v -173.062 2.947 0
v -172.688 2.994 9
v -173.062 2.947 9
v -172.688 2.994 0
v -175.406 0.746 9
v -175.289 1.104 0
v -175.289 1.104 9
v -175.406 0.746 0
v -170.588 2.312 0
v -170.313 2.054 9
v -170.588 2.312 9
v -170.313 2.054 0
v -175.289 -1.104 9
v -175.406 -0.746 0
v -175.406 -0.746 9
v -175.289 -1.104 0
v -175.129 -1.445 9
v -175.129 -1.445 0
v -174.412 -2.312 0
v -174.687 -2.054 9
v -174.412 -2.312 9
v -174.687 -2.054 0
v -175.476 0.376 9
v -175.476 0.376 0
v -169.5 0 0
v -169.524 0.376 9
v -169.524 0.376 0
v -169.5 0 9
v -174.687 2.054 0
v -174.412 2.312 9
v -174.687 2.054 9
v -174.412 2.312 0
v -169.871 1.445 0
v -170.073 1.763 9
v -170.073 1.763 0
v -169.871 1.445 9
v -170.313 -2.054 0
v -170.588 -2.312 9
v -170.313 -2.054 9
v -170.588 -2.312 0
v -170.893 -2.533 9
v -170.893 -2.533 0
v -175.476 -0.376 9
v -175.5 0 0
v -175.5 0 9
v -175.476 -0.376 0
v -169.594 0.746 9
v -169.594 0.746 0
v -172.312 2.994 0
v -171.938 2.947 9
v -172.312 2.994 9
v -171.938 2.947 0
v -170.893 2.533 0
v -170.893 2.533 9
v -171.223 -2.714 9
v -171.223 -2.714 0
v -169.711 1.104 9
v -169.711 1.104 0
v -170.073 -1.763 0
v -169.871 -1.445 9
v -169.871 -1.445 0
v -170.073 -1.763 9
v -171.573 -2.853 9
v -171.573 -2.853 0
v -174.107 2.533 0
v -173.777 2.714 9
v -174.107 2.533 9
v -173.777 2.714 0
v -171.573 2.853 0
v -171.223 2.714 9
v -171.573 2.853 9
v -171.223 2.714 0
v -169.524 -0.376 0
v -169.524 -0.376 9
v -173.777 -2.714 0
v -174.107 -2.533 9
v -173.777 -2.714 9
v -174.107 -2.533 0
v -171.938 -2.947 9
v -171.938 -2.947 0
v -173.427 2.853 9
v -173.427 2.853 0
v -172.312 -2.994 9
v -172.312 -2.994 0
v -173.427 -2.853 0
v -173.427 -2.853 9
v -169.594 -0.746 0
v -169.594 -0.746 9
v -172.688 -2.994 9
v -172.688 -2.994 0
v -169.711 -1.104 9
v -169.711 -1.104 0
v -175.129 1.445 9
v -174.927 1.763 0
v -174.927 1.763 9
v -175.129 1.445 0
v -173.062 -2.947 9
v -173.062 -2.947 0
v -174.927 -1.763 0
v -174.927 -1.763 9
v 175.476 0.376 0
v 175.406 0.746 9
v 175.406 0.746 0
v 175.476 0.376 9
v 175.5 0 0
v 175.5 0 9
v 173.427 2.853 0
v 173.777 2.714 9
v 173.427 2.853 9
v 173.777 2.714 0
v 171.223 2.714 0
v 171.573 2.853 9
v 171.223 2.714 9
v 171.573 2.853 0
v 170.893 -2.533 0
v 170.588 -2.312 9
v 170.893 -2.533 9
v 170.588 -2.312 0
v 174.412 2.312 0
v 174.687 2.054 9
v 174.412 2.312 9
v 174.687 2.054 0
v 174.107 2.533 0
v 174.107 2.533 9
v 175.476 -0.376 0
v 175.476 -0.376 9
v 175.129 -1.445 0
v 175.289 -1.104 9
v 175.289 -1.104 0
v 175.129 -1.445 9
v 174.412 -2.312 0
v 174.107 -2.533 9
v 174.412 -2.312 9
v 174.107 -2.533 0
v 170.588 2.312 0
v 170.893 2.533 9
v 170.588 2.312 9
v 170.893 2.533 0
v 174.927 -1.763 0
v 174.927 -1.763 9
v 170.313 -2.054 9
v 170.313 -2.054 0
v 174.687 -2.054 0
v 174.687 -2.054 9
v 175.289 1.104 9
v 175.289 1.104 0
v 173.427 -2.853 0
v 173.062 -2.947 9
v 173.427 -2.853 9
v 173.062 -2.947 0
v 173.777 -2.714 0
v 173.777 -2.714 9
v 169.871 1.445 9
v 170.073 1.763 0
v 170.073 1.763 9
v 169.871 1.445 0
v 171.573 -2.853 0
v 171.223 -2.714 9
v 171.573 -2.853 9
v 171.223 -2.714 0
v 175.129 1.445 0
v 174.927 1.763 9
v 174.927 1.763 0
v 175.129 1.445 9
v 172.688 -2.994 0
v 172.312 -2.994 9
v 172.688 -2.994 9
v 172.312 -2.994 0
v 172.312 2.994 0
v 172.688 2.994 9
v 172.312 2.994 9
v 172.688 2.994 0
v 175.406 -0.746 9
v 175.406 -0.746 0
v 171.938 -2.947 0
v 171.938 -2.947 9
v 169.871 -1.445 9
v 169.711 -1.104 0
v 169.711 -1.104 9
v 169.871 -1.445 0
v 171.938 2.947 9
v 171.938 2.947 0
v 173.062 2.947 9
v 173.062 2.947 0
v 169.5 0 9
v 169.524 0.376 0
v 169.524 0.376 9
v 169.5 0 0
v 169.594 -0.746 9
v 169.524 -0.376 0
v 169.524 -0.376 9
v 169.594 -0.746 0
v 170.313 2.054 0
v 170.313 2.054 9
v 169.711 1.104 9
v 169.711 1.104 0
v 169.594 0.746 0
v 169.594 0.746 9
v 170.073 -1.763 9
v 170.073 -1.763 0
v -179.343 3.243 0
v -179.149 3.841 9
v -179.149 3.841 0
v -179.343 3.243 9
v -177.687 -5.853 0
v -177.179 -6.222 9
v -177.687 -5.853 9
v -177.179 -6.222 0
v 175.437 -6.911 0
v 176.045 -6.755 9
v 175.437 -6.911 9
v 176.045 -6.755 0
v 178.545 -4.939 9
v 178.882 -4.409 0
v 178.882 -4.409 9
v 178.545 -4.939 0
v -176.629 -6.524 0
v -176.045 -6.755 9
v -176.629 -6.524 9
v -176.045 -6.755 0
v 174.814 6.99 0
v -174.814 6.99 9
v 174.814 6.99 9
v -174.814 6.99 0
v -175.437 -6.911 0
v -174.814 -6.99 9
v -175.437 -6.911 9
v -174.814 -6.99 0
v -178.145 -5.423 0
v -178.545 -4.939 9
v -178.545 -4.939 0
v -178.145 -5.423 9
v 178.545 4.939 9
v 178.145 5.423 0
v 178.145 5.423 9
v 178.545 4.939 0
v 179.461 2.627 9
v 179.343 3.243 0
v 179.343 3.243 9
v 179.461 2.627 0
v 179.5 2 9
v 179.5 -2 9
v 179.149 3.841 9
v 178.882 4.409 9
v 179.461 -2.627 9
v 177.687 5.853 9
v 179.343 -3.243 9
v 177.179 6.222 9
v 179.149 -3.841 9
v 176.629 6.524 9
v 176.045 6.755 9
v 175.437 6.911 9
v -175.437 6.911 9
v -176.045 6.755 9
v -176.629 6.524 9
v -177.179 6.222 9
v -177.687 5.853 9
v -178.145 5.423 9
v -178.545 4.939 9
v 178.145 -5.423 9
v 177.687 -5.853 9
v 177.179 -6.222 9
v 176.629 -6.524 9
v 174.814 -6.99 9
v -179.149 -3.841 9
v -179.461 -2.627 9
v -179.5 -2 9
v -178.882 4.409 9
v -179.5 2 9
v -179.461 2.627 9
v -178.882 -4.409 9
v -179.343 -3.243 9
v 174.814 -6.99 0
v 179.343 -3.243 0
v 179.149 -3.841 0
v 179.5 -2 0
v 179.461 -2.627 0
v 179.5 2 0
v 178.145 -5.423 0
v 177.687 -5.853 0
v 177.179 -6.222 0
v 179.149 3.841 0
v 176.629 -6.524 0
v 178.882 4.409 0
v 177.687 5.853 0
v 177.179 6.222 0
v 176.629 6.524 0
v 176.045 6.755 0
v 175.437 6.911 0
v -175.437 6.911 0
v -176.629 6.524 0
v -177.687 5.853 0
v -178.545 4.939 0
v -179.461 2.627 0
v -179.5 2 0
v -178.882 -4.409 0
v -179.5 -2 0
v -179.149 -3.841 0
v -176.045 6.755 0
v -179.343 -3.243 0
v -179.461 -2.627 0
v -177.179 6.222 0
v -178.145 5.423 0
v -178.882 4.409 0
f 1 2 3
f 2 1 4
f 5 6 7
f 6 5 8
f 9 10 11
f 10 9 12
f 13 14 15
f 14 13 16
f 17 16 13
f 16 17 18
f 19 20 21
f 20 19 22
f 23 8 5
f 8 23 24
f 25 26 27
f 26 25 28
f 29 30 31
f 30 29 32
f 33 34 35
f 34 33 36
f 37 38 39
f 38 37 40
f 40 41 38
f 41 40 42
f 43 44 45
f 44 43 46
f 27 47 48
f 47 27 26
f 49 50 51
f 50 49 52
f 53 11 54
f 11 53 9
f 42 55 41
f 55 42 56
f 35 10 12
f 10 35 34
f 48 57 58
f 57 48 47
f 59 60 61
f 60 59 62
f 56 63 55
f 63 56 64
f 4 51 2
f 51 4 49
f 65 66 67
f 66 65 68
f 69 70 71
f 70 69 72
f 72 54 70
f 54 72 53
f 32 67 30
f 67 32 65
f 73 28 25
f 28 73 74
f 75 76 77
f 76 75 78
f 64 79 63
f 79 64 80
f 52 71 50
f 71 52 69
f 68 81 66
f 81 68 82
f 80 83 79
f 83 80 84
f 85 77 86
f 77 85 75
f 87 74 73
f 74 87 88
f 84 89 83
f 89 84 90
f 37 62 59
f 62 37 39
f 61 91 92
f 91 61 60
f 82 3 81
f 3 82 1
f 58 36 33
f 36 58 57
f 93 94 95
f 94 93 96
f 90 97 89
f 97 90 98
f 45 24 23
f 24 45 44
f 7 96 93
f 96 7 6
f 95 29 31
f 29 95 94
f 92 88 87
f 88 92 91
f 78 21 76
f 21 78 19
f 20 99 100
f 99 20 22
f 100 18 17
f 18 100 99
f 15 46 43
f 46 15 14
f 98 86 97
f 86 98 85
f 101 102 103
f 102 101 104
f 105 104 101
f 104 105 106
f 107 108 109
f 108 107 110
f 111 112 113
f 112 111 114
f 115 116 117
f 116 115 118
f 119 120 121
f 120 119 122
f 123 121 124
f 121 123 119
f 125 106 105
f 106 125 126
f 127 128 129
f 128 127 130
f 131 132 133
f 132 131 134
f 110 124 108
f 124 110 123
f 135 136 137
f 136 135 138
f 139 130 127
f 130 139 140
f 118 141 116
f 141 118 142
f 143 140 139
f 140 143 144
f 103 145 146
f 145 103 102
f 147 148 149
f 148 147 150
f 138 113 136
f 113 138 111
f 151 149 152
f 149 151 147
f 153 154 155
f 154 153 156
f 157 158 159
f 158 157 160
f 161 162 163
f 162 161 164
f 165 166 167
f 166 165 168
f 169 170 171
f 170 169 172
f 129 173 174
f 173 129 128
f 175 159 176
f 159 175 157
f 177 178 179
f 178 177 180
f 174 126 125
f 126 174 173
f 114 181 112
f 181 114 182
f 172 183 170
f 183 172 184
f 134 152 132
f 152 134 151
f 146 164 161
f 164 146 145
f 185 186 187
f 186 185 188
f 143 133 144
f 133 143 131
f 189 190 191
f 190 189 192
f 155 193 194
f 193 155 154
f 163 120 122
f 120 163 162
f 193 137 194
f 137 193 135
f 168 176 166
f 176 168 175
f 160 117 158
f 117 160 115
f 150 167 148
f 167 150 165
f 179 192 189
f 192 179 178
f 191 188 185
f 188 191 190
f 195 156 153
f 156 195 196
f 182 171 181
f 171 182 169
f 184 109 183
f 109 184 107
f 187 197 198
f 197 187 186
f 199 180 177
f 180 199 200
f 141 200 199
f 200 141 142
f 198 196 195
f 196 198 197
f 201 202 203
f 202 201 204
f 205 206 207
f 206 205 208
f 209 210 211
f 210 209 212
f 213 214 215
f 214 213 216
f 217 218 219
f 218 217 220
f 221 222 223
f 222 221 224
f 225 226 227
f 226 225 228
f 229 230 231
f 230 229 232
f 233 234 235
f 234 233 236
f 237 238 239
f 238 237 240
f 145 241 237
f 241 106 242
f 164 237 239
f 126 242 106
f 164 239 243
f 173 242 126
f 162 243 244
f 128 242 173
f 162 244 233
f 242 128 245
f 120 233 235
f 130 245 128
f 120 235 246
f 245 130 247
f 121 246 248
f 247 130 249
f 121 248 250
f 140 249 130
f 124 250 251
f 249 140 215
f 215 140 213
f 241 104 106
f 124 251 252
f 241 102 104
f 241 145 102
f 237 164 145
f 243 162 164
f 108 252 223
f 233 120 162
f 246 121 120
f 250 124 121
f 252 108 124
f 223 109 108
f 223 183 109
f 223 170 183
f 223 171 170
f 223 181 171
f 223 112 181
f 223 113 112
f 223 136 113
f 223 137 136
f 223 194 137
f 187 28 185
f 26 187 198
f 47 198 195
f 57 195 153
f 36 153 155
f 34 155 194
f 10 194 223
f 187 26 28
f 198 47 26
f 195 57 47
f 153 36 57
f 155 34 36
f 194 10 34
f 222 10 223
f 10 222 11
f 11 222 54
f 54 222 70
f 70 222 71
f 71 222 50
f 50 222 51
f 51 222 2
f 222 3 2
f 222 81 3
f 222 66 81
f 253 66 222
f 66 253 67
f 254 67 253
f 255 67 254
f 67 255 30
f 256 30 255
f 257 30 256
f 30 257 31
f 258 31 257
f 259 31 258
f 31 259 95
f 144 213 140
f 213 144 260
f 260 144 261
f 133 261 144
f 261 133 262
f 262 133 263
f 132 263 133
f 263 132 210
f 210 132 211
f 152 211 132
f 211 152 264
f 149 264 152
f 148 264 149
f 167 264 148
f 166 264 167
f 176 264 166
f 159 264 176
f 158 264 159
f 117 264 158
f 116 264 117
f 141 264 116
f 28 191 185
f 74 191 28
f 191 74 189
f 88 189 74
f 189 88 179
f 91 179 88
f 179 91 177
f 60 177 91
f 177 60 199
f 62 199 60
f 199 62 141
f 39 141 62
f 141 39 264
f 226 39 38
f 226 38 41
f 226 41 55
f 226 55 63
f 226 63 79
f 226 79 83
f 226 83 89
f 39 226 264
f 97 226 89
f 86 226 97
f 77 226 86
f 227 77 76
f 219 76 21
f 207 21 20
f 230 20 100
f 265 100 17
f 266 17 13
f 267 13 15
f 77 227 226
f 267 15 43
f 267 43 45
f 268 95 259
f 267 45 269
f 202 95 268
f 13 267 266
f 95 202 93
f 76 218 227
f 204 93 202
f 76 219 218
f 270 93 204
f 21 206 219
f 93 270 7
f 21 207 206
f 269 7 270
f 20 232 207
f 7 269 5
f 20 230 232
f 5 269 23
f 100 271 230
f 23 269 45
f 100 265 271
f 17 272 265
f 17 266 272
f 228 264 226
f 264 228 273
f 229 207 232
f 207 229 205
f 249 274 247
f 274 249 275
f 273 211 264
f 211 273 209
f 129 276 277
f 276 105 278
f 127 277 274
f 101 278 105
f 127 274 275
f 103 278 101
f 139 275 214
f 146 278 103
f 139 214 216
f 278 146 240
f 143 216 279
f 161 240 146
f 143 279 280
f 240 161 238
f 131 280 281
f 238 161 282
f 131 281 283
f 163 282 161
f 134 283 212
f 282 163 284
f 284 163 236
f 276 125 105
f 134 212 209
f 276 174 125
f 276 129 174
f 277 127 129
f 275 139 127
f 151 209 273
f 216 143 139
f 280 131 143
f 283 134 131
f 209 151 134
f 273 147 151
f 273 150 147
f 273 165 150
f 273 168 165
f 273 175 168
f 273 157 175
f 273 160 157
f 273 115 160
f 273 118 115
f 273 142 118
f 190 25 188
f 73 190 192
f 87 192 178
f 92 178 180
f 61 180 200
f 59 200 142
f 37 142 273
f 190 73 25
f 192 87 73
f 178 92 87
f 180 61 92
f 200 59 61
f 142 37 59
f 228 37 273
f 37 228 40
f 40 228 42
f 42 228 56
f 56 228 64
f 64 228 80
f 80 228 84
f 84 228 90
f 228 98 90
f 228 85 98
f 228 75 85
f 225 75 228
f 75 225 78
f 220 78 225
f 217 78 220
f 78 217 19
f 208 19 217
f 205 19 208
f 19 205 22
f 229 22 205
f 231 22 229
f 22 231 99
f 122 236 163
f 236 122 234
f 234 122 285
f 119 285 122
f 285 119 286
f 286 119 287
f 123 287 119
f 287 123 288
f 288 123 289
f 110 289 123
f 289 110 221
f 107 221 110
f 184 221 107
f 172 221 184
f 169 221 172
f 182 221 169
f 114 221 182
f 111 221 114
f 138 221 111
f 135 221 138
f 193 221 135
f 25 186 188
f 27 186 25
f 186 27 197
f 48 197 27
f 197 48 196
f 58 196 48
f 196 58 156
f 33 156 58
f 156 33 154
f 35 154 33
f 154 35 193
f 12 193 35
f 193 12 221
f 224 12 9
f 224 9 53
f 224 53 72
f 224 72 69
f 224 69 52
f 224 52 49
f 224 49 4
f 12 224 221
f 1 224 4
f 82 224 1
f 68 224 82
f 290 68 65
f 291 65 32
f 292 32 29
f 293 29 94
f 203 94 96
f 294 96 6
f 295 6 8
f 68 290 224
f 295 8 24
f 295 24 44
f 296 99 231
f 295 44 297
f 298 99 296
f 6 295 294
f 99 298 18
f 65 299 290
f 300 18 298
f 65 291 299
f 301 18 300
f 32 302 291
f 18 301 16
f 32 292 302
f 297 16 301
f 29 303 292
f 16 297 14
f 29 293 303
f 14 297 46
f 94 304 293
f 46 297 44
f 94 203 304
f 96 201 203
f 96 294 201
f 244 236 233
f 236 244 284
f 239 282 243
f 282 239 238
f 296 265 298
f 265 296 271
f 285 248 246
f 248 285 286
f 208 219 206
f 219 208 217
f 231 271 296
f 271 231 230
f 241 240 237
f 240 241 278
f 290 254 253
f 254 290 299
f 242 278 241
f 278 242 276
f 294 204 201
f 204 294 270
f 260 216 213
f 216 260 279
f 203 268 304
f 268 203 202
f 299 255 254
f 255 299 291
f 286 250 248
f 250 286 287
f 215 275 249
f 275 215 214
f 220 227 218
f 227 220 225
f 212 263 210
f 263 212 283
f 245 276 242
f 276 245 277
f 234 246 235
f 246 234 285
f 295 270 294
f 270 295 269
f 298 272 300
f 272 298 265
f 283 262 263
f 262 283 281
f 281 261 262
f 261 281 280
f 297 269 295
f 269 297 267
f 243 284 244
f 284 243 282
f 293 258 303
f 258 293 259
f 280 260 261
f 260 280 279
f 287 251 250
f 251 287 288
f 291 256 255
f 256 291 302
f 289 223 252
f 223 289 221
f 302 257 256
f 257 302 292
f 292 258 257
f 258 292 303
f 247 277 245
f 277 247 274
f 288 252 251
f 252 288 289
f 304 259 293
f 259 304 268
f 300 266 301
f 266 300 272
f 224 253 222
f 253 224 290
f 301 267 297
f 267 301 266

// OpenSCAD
$fn = 50;


difference() {
	union() {
		hull() {
			translate(v = [-174.5000000000, 2.0000000000, 0]) {
				cylinder(h = 9, r = 5);
			}
			translate(v = [174.5000000000, 2.0000000000, 0]) {
				cylinder(h = 9, r = 5);
			}
			translate(v = [-174.5000000000, -2.0000000000, 0]) {
				cylinder(h = 9, r = 5);
			}
			translate(v = [174.5000000000, -2.0000000000, 0]) {
				cylinder(h = 9, r = 5);
			}
		}
	}
	union() {
		translate(v = [-172.5000000000, 0.0000000000, -100.0000000000]) {
			cylinder(h = 200, r = 3.0000000000);
		}
		translate(v = [-172.5000000000, 0.0000000000, -100.0000000000]) {
			cylinder(h = 200, r = 3.0000000000);
		}
		translate(v = [172.5000000000, 0.0000000000, -100.0000000000]) {
			cylinder(h = 200, r = 3.0000000000);
		}
		translate(v = [172.5000000000, 0.0000000000, -100.0000000000]) {
			cylinder(h = 200, r = 3.0000000000);
		}
	}
}
